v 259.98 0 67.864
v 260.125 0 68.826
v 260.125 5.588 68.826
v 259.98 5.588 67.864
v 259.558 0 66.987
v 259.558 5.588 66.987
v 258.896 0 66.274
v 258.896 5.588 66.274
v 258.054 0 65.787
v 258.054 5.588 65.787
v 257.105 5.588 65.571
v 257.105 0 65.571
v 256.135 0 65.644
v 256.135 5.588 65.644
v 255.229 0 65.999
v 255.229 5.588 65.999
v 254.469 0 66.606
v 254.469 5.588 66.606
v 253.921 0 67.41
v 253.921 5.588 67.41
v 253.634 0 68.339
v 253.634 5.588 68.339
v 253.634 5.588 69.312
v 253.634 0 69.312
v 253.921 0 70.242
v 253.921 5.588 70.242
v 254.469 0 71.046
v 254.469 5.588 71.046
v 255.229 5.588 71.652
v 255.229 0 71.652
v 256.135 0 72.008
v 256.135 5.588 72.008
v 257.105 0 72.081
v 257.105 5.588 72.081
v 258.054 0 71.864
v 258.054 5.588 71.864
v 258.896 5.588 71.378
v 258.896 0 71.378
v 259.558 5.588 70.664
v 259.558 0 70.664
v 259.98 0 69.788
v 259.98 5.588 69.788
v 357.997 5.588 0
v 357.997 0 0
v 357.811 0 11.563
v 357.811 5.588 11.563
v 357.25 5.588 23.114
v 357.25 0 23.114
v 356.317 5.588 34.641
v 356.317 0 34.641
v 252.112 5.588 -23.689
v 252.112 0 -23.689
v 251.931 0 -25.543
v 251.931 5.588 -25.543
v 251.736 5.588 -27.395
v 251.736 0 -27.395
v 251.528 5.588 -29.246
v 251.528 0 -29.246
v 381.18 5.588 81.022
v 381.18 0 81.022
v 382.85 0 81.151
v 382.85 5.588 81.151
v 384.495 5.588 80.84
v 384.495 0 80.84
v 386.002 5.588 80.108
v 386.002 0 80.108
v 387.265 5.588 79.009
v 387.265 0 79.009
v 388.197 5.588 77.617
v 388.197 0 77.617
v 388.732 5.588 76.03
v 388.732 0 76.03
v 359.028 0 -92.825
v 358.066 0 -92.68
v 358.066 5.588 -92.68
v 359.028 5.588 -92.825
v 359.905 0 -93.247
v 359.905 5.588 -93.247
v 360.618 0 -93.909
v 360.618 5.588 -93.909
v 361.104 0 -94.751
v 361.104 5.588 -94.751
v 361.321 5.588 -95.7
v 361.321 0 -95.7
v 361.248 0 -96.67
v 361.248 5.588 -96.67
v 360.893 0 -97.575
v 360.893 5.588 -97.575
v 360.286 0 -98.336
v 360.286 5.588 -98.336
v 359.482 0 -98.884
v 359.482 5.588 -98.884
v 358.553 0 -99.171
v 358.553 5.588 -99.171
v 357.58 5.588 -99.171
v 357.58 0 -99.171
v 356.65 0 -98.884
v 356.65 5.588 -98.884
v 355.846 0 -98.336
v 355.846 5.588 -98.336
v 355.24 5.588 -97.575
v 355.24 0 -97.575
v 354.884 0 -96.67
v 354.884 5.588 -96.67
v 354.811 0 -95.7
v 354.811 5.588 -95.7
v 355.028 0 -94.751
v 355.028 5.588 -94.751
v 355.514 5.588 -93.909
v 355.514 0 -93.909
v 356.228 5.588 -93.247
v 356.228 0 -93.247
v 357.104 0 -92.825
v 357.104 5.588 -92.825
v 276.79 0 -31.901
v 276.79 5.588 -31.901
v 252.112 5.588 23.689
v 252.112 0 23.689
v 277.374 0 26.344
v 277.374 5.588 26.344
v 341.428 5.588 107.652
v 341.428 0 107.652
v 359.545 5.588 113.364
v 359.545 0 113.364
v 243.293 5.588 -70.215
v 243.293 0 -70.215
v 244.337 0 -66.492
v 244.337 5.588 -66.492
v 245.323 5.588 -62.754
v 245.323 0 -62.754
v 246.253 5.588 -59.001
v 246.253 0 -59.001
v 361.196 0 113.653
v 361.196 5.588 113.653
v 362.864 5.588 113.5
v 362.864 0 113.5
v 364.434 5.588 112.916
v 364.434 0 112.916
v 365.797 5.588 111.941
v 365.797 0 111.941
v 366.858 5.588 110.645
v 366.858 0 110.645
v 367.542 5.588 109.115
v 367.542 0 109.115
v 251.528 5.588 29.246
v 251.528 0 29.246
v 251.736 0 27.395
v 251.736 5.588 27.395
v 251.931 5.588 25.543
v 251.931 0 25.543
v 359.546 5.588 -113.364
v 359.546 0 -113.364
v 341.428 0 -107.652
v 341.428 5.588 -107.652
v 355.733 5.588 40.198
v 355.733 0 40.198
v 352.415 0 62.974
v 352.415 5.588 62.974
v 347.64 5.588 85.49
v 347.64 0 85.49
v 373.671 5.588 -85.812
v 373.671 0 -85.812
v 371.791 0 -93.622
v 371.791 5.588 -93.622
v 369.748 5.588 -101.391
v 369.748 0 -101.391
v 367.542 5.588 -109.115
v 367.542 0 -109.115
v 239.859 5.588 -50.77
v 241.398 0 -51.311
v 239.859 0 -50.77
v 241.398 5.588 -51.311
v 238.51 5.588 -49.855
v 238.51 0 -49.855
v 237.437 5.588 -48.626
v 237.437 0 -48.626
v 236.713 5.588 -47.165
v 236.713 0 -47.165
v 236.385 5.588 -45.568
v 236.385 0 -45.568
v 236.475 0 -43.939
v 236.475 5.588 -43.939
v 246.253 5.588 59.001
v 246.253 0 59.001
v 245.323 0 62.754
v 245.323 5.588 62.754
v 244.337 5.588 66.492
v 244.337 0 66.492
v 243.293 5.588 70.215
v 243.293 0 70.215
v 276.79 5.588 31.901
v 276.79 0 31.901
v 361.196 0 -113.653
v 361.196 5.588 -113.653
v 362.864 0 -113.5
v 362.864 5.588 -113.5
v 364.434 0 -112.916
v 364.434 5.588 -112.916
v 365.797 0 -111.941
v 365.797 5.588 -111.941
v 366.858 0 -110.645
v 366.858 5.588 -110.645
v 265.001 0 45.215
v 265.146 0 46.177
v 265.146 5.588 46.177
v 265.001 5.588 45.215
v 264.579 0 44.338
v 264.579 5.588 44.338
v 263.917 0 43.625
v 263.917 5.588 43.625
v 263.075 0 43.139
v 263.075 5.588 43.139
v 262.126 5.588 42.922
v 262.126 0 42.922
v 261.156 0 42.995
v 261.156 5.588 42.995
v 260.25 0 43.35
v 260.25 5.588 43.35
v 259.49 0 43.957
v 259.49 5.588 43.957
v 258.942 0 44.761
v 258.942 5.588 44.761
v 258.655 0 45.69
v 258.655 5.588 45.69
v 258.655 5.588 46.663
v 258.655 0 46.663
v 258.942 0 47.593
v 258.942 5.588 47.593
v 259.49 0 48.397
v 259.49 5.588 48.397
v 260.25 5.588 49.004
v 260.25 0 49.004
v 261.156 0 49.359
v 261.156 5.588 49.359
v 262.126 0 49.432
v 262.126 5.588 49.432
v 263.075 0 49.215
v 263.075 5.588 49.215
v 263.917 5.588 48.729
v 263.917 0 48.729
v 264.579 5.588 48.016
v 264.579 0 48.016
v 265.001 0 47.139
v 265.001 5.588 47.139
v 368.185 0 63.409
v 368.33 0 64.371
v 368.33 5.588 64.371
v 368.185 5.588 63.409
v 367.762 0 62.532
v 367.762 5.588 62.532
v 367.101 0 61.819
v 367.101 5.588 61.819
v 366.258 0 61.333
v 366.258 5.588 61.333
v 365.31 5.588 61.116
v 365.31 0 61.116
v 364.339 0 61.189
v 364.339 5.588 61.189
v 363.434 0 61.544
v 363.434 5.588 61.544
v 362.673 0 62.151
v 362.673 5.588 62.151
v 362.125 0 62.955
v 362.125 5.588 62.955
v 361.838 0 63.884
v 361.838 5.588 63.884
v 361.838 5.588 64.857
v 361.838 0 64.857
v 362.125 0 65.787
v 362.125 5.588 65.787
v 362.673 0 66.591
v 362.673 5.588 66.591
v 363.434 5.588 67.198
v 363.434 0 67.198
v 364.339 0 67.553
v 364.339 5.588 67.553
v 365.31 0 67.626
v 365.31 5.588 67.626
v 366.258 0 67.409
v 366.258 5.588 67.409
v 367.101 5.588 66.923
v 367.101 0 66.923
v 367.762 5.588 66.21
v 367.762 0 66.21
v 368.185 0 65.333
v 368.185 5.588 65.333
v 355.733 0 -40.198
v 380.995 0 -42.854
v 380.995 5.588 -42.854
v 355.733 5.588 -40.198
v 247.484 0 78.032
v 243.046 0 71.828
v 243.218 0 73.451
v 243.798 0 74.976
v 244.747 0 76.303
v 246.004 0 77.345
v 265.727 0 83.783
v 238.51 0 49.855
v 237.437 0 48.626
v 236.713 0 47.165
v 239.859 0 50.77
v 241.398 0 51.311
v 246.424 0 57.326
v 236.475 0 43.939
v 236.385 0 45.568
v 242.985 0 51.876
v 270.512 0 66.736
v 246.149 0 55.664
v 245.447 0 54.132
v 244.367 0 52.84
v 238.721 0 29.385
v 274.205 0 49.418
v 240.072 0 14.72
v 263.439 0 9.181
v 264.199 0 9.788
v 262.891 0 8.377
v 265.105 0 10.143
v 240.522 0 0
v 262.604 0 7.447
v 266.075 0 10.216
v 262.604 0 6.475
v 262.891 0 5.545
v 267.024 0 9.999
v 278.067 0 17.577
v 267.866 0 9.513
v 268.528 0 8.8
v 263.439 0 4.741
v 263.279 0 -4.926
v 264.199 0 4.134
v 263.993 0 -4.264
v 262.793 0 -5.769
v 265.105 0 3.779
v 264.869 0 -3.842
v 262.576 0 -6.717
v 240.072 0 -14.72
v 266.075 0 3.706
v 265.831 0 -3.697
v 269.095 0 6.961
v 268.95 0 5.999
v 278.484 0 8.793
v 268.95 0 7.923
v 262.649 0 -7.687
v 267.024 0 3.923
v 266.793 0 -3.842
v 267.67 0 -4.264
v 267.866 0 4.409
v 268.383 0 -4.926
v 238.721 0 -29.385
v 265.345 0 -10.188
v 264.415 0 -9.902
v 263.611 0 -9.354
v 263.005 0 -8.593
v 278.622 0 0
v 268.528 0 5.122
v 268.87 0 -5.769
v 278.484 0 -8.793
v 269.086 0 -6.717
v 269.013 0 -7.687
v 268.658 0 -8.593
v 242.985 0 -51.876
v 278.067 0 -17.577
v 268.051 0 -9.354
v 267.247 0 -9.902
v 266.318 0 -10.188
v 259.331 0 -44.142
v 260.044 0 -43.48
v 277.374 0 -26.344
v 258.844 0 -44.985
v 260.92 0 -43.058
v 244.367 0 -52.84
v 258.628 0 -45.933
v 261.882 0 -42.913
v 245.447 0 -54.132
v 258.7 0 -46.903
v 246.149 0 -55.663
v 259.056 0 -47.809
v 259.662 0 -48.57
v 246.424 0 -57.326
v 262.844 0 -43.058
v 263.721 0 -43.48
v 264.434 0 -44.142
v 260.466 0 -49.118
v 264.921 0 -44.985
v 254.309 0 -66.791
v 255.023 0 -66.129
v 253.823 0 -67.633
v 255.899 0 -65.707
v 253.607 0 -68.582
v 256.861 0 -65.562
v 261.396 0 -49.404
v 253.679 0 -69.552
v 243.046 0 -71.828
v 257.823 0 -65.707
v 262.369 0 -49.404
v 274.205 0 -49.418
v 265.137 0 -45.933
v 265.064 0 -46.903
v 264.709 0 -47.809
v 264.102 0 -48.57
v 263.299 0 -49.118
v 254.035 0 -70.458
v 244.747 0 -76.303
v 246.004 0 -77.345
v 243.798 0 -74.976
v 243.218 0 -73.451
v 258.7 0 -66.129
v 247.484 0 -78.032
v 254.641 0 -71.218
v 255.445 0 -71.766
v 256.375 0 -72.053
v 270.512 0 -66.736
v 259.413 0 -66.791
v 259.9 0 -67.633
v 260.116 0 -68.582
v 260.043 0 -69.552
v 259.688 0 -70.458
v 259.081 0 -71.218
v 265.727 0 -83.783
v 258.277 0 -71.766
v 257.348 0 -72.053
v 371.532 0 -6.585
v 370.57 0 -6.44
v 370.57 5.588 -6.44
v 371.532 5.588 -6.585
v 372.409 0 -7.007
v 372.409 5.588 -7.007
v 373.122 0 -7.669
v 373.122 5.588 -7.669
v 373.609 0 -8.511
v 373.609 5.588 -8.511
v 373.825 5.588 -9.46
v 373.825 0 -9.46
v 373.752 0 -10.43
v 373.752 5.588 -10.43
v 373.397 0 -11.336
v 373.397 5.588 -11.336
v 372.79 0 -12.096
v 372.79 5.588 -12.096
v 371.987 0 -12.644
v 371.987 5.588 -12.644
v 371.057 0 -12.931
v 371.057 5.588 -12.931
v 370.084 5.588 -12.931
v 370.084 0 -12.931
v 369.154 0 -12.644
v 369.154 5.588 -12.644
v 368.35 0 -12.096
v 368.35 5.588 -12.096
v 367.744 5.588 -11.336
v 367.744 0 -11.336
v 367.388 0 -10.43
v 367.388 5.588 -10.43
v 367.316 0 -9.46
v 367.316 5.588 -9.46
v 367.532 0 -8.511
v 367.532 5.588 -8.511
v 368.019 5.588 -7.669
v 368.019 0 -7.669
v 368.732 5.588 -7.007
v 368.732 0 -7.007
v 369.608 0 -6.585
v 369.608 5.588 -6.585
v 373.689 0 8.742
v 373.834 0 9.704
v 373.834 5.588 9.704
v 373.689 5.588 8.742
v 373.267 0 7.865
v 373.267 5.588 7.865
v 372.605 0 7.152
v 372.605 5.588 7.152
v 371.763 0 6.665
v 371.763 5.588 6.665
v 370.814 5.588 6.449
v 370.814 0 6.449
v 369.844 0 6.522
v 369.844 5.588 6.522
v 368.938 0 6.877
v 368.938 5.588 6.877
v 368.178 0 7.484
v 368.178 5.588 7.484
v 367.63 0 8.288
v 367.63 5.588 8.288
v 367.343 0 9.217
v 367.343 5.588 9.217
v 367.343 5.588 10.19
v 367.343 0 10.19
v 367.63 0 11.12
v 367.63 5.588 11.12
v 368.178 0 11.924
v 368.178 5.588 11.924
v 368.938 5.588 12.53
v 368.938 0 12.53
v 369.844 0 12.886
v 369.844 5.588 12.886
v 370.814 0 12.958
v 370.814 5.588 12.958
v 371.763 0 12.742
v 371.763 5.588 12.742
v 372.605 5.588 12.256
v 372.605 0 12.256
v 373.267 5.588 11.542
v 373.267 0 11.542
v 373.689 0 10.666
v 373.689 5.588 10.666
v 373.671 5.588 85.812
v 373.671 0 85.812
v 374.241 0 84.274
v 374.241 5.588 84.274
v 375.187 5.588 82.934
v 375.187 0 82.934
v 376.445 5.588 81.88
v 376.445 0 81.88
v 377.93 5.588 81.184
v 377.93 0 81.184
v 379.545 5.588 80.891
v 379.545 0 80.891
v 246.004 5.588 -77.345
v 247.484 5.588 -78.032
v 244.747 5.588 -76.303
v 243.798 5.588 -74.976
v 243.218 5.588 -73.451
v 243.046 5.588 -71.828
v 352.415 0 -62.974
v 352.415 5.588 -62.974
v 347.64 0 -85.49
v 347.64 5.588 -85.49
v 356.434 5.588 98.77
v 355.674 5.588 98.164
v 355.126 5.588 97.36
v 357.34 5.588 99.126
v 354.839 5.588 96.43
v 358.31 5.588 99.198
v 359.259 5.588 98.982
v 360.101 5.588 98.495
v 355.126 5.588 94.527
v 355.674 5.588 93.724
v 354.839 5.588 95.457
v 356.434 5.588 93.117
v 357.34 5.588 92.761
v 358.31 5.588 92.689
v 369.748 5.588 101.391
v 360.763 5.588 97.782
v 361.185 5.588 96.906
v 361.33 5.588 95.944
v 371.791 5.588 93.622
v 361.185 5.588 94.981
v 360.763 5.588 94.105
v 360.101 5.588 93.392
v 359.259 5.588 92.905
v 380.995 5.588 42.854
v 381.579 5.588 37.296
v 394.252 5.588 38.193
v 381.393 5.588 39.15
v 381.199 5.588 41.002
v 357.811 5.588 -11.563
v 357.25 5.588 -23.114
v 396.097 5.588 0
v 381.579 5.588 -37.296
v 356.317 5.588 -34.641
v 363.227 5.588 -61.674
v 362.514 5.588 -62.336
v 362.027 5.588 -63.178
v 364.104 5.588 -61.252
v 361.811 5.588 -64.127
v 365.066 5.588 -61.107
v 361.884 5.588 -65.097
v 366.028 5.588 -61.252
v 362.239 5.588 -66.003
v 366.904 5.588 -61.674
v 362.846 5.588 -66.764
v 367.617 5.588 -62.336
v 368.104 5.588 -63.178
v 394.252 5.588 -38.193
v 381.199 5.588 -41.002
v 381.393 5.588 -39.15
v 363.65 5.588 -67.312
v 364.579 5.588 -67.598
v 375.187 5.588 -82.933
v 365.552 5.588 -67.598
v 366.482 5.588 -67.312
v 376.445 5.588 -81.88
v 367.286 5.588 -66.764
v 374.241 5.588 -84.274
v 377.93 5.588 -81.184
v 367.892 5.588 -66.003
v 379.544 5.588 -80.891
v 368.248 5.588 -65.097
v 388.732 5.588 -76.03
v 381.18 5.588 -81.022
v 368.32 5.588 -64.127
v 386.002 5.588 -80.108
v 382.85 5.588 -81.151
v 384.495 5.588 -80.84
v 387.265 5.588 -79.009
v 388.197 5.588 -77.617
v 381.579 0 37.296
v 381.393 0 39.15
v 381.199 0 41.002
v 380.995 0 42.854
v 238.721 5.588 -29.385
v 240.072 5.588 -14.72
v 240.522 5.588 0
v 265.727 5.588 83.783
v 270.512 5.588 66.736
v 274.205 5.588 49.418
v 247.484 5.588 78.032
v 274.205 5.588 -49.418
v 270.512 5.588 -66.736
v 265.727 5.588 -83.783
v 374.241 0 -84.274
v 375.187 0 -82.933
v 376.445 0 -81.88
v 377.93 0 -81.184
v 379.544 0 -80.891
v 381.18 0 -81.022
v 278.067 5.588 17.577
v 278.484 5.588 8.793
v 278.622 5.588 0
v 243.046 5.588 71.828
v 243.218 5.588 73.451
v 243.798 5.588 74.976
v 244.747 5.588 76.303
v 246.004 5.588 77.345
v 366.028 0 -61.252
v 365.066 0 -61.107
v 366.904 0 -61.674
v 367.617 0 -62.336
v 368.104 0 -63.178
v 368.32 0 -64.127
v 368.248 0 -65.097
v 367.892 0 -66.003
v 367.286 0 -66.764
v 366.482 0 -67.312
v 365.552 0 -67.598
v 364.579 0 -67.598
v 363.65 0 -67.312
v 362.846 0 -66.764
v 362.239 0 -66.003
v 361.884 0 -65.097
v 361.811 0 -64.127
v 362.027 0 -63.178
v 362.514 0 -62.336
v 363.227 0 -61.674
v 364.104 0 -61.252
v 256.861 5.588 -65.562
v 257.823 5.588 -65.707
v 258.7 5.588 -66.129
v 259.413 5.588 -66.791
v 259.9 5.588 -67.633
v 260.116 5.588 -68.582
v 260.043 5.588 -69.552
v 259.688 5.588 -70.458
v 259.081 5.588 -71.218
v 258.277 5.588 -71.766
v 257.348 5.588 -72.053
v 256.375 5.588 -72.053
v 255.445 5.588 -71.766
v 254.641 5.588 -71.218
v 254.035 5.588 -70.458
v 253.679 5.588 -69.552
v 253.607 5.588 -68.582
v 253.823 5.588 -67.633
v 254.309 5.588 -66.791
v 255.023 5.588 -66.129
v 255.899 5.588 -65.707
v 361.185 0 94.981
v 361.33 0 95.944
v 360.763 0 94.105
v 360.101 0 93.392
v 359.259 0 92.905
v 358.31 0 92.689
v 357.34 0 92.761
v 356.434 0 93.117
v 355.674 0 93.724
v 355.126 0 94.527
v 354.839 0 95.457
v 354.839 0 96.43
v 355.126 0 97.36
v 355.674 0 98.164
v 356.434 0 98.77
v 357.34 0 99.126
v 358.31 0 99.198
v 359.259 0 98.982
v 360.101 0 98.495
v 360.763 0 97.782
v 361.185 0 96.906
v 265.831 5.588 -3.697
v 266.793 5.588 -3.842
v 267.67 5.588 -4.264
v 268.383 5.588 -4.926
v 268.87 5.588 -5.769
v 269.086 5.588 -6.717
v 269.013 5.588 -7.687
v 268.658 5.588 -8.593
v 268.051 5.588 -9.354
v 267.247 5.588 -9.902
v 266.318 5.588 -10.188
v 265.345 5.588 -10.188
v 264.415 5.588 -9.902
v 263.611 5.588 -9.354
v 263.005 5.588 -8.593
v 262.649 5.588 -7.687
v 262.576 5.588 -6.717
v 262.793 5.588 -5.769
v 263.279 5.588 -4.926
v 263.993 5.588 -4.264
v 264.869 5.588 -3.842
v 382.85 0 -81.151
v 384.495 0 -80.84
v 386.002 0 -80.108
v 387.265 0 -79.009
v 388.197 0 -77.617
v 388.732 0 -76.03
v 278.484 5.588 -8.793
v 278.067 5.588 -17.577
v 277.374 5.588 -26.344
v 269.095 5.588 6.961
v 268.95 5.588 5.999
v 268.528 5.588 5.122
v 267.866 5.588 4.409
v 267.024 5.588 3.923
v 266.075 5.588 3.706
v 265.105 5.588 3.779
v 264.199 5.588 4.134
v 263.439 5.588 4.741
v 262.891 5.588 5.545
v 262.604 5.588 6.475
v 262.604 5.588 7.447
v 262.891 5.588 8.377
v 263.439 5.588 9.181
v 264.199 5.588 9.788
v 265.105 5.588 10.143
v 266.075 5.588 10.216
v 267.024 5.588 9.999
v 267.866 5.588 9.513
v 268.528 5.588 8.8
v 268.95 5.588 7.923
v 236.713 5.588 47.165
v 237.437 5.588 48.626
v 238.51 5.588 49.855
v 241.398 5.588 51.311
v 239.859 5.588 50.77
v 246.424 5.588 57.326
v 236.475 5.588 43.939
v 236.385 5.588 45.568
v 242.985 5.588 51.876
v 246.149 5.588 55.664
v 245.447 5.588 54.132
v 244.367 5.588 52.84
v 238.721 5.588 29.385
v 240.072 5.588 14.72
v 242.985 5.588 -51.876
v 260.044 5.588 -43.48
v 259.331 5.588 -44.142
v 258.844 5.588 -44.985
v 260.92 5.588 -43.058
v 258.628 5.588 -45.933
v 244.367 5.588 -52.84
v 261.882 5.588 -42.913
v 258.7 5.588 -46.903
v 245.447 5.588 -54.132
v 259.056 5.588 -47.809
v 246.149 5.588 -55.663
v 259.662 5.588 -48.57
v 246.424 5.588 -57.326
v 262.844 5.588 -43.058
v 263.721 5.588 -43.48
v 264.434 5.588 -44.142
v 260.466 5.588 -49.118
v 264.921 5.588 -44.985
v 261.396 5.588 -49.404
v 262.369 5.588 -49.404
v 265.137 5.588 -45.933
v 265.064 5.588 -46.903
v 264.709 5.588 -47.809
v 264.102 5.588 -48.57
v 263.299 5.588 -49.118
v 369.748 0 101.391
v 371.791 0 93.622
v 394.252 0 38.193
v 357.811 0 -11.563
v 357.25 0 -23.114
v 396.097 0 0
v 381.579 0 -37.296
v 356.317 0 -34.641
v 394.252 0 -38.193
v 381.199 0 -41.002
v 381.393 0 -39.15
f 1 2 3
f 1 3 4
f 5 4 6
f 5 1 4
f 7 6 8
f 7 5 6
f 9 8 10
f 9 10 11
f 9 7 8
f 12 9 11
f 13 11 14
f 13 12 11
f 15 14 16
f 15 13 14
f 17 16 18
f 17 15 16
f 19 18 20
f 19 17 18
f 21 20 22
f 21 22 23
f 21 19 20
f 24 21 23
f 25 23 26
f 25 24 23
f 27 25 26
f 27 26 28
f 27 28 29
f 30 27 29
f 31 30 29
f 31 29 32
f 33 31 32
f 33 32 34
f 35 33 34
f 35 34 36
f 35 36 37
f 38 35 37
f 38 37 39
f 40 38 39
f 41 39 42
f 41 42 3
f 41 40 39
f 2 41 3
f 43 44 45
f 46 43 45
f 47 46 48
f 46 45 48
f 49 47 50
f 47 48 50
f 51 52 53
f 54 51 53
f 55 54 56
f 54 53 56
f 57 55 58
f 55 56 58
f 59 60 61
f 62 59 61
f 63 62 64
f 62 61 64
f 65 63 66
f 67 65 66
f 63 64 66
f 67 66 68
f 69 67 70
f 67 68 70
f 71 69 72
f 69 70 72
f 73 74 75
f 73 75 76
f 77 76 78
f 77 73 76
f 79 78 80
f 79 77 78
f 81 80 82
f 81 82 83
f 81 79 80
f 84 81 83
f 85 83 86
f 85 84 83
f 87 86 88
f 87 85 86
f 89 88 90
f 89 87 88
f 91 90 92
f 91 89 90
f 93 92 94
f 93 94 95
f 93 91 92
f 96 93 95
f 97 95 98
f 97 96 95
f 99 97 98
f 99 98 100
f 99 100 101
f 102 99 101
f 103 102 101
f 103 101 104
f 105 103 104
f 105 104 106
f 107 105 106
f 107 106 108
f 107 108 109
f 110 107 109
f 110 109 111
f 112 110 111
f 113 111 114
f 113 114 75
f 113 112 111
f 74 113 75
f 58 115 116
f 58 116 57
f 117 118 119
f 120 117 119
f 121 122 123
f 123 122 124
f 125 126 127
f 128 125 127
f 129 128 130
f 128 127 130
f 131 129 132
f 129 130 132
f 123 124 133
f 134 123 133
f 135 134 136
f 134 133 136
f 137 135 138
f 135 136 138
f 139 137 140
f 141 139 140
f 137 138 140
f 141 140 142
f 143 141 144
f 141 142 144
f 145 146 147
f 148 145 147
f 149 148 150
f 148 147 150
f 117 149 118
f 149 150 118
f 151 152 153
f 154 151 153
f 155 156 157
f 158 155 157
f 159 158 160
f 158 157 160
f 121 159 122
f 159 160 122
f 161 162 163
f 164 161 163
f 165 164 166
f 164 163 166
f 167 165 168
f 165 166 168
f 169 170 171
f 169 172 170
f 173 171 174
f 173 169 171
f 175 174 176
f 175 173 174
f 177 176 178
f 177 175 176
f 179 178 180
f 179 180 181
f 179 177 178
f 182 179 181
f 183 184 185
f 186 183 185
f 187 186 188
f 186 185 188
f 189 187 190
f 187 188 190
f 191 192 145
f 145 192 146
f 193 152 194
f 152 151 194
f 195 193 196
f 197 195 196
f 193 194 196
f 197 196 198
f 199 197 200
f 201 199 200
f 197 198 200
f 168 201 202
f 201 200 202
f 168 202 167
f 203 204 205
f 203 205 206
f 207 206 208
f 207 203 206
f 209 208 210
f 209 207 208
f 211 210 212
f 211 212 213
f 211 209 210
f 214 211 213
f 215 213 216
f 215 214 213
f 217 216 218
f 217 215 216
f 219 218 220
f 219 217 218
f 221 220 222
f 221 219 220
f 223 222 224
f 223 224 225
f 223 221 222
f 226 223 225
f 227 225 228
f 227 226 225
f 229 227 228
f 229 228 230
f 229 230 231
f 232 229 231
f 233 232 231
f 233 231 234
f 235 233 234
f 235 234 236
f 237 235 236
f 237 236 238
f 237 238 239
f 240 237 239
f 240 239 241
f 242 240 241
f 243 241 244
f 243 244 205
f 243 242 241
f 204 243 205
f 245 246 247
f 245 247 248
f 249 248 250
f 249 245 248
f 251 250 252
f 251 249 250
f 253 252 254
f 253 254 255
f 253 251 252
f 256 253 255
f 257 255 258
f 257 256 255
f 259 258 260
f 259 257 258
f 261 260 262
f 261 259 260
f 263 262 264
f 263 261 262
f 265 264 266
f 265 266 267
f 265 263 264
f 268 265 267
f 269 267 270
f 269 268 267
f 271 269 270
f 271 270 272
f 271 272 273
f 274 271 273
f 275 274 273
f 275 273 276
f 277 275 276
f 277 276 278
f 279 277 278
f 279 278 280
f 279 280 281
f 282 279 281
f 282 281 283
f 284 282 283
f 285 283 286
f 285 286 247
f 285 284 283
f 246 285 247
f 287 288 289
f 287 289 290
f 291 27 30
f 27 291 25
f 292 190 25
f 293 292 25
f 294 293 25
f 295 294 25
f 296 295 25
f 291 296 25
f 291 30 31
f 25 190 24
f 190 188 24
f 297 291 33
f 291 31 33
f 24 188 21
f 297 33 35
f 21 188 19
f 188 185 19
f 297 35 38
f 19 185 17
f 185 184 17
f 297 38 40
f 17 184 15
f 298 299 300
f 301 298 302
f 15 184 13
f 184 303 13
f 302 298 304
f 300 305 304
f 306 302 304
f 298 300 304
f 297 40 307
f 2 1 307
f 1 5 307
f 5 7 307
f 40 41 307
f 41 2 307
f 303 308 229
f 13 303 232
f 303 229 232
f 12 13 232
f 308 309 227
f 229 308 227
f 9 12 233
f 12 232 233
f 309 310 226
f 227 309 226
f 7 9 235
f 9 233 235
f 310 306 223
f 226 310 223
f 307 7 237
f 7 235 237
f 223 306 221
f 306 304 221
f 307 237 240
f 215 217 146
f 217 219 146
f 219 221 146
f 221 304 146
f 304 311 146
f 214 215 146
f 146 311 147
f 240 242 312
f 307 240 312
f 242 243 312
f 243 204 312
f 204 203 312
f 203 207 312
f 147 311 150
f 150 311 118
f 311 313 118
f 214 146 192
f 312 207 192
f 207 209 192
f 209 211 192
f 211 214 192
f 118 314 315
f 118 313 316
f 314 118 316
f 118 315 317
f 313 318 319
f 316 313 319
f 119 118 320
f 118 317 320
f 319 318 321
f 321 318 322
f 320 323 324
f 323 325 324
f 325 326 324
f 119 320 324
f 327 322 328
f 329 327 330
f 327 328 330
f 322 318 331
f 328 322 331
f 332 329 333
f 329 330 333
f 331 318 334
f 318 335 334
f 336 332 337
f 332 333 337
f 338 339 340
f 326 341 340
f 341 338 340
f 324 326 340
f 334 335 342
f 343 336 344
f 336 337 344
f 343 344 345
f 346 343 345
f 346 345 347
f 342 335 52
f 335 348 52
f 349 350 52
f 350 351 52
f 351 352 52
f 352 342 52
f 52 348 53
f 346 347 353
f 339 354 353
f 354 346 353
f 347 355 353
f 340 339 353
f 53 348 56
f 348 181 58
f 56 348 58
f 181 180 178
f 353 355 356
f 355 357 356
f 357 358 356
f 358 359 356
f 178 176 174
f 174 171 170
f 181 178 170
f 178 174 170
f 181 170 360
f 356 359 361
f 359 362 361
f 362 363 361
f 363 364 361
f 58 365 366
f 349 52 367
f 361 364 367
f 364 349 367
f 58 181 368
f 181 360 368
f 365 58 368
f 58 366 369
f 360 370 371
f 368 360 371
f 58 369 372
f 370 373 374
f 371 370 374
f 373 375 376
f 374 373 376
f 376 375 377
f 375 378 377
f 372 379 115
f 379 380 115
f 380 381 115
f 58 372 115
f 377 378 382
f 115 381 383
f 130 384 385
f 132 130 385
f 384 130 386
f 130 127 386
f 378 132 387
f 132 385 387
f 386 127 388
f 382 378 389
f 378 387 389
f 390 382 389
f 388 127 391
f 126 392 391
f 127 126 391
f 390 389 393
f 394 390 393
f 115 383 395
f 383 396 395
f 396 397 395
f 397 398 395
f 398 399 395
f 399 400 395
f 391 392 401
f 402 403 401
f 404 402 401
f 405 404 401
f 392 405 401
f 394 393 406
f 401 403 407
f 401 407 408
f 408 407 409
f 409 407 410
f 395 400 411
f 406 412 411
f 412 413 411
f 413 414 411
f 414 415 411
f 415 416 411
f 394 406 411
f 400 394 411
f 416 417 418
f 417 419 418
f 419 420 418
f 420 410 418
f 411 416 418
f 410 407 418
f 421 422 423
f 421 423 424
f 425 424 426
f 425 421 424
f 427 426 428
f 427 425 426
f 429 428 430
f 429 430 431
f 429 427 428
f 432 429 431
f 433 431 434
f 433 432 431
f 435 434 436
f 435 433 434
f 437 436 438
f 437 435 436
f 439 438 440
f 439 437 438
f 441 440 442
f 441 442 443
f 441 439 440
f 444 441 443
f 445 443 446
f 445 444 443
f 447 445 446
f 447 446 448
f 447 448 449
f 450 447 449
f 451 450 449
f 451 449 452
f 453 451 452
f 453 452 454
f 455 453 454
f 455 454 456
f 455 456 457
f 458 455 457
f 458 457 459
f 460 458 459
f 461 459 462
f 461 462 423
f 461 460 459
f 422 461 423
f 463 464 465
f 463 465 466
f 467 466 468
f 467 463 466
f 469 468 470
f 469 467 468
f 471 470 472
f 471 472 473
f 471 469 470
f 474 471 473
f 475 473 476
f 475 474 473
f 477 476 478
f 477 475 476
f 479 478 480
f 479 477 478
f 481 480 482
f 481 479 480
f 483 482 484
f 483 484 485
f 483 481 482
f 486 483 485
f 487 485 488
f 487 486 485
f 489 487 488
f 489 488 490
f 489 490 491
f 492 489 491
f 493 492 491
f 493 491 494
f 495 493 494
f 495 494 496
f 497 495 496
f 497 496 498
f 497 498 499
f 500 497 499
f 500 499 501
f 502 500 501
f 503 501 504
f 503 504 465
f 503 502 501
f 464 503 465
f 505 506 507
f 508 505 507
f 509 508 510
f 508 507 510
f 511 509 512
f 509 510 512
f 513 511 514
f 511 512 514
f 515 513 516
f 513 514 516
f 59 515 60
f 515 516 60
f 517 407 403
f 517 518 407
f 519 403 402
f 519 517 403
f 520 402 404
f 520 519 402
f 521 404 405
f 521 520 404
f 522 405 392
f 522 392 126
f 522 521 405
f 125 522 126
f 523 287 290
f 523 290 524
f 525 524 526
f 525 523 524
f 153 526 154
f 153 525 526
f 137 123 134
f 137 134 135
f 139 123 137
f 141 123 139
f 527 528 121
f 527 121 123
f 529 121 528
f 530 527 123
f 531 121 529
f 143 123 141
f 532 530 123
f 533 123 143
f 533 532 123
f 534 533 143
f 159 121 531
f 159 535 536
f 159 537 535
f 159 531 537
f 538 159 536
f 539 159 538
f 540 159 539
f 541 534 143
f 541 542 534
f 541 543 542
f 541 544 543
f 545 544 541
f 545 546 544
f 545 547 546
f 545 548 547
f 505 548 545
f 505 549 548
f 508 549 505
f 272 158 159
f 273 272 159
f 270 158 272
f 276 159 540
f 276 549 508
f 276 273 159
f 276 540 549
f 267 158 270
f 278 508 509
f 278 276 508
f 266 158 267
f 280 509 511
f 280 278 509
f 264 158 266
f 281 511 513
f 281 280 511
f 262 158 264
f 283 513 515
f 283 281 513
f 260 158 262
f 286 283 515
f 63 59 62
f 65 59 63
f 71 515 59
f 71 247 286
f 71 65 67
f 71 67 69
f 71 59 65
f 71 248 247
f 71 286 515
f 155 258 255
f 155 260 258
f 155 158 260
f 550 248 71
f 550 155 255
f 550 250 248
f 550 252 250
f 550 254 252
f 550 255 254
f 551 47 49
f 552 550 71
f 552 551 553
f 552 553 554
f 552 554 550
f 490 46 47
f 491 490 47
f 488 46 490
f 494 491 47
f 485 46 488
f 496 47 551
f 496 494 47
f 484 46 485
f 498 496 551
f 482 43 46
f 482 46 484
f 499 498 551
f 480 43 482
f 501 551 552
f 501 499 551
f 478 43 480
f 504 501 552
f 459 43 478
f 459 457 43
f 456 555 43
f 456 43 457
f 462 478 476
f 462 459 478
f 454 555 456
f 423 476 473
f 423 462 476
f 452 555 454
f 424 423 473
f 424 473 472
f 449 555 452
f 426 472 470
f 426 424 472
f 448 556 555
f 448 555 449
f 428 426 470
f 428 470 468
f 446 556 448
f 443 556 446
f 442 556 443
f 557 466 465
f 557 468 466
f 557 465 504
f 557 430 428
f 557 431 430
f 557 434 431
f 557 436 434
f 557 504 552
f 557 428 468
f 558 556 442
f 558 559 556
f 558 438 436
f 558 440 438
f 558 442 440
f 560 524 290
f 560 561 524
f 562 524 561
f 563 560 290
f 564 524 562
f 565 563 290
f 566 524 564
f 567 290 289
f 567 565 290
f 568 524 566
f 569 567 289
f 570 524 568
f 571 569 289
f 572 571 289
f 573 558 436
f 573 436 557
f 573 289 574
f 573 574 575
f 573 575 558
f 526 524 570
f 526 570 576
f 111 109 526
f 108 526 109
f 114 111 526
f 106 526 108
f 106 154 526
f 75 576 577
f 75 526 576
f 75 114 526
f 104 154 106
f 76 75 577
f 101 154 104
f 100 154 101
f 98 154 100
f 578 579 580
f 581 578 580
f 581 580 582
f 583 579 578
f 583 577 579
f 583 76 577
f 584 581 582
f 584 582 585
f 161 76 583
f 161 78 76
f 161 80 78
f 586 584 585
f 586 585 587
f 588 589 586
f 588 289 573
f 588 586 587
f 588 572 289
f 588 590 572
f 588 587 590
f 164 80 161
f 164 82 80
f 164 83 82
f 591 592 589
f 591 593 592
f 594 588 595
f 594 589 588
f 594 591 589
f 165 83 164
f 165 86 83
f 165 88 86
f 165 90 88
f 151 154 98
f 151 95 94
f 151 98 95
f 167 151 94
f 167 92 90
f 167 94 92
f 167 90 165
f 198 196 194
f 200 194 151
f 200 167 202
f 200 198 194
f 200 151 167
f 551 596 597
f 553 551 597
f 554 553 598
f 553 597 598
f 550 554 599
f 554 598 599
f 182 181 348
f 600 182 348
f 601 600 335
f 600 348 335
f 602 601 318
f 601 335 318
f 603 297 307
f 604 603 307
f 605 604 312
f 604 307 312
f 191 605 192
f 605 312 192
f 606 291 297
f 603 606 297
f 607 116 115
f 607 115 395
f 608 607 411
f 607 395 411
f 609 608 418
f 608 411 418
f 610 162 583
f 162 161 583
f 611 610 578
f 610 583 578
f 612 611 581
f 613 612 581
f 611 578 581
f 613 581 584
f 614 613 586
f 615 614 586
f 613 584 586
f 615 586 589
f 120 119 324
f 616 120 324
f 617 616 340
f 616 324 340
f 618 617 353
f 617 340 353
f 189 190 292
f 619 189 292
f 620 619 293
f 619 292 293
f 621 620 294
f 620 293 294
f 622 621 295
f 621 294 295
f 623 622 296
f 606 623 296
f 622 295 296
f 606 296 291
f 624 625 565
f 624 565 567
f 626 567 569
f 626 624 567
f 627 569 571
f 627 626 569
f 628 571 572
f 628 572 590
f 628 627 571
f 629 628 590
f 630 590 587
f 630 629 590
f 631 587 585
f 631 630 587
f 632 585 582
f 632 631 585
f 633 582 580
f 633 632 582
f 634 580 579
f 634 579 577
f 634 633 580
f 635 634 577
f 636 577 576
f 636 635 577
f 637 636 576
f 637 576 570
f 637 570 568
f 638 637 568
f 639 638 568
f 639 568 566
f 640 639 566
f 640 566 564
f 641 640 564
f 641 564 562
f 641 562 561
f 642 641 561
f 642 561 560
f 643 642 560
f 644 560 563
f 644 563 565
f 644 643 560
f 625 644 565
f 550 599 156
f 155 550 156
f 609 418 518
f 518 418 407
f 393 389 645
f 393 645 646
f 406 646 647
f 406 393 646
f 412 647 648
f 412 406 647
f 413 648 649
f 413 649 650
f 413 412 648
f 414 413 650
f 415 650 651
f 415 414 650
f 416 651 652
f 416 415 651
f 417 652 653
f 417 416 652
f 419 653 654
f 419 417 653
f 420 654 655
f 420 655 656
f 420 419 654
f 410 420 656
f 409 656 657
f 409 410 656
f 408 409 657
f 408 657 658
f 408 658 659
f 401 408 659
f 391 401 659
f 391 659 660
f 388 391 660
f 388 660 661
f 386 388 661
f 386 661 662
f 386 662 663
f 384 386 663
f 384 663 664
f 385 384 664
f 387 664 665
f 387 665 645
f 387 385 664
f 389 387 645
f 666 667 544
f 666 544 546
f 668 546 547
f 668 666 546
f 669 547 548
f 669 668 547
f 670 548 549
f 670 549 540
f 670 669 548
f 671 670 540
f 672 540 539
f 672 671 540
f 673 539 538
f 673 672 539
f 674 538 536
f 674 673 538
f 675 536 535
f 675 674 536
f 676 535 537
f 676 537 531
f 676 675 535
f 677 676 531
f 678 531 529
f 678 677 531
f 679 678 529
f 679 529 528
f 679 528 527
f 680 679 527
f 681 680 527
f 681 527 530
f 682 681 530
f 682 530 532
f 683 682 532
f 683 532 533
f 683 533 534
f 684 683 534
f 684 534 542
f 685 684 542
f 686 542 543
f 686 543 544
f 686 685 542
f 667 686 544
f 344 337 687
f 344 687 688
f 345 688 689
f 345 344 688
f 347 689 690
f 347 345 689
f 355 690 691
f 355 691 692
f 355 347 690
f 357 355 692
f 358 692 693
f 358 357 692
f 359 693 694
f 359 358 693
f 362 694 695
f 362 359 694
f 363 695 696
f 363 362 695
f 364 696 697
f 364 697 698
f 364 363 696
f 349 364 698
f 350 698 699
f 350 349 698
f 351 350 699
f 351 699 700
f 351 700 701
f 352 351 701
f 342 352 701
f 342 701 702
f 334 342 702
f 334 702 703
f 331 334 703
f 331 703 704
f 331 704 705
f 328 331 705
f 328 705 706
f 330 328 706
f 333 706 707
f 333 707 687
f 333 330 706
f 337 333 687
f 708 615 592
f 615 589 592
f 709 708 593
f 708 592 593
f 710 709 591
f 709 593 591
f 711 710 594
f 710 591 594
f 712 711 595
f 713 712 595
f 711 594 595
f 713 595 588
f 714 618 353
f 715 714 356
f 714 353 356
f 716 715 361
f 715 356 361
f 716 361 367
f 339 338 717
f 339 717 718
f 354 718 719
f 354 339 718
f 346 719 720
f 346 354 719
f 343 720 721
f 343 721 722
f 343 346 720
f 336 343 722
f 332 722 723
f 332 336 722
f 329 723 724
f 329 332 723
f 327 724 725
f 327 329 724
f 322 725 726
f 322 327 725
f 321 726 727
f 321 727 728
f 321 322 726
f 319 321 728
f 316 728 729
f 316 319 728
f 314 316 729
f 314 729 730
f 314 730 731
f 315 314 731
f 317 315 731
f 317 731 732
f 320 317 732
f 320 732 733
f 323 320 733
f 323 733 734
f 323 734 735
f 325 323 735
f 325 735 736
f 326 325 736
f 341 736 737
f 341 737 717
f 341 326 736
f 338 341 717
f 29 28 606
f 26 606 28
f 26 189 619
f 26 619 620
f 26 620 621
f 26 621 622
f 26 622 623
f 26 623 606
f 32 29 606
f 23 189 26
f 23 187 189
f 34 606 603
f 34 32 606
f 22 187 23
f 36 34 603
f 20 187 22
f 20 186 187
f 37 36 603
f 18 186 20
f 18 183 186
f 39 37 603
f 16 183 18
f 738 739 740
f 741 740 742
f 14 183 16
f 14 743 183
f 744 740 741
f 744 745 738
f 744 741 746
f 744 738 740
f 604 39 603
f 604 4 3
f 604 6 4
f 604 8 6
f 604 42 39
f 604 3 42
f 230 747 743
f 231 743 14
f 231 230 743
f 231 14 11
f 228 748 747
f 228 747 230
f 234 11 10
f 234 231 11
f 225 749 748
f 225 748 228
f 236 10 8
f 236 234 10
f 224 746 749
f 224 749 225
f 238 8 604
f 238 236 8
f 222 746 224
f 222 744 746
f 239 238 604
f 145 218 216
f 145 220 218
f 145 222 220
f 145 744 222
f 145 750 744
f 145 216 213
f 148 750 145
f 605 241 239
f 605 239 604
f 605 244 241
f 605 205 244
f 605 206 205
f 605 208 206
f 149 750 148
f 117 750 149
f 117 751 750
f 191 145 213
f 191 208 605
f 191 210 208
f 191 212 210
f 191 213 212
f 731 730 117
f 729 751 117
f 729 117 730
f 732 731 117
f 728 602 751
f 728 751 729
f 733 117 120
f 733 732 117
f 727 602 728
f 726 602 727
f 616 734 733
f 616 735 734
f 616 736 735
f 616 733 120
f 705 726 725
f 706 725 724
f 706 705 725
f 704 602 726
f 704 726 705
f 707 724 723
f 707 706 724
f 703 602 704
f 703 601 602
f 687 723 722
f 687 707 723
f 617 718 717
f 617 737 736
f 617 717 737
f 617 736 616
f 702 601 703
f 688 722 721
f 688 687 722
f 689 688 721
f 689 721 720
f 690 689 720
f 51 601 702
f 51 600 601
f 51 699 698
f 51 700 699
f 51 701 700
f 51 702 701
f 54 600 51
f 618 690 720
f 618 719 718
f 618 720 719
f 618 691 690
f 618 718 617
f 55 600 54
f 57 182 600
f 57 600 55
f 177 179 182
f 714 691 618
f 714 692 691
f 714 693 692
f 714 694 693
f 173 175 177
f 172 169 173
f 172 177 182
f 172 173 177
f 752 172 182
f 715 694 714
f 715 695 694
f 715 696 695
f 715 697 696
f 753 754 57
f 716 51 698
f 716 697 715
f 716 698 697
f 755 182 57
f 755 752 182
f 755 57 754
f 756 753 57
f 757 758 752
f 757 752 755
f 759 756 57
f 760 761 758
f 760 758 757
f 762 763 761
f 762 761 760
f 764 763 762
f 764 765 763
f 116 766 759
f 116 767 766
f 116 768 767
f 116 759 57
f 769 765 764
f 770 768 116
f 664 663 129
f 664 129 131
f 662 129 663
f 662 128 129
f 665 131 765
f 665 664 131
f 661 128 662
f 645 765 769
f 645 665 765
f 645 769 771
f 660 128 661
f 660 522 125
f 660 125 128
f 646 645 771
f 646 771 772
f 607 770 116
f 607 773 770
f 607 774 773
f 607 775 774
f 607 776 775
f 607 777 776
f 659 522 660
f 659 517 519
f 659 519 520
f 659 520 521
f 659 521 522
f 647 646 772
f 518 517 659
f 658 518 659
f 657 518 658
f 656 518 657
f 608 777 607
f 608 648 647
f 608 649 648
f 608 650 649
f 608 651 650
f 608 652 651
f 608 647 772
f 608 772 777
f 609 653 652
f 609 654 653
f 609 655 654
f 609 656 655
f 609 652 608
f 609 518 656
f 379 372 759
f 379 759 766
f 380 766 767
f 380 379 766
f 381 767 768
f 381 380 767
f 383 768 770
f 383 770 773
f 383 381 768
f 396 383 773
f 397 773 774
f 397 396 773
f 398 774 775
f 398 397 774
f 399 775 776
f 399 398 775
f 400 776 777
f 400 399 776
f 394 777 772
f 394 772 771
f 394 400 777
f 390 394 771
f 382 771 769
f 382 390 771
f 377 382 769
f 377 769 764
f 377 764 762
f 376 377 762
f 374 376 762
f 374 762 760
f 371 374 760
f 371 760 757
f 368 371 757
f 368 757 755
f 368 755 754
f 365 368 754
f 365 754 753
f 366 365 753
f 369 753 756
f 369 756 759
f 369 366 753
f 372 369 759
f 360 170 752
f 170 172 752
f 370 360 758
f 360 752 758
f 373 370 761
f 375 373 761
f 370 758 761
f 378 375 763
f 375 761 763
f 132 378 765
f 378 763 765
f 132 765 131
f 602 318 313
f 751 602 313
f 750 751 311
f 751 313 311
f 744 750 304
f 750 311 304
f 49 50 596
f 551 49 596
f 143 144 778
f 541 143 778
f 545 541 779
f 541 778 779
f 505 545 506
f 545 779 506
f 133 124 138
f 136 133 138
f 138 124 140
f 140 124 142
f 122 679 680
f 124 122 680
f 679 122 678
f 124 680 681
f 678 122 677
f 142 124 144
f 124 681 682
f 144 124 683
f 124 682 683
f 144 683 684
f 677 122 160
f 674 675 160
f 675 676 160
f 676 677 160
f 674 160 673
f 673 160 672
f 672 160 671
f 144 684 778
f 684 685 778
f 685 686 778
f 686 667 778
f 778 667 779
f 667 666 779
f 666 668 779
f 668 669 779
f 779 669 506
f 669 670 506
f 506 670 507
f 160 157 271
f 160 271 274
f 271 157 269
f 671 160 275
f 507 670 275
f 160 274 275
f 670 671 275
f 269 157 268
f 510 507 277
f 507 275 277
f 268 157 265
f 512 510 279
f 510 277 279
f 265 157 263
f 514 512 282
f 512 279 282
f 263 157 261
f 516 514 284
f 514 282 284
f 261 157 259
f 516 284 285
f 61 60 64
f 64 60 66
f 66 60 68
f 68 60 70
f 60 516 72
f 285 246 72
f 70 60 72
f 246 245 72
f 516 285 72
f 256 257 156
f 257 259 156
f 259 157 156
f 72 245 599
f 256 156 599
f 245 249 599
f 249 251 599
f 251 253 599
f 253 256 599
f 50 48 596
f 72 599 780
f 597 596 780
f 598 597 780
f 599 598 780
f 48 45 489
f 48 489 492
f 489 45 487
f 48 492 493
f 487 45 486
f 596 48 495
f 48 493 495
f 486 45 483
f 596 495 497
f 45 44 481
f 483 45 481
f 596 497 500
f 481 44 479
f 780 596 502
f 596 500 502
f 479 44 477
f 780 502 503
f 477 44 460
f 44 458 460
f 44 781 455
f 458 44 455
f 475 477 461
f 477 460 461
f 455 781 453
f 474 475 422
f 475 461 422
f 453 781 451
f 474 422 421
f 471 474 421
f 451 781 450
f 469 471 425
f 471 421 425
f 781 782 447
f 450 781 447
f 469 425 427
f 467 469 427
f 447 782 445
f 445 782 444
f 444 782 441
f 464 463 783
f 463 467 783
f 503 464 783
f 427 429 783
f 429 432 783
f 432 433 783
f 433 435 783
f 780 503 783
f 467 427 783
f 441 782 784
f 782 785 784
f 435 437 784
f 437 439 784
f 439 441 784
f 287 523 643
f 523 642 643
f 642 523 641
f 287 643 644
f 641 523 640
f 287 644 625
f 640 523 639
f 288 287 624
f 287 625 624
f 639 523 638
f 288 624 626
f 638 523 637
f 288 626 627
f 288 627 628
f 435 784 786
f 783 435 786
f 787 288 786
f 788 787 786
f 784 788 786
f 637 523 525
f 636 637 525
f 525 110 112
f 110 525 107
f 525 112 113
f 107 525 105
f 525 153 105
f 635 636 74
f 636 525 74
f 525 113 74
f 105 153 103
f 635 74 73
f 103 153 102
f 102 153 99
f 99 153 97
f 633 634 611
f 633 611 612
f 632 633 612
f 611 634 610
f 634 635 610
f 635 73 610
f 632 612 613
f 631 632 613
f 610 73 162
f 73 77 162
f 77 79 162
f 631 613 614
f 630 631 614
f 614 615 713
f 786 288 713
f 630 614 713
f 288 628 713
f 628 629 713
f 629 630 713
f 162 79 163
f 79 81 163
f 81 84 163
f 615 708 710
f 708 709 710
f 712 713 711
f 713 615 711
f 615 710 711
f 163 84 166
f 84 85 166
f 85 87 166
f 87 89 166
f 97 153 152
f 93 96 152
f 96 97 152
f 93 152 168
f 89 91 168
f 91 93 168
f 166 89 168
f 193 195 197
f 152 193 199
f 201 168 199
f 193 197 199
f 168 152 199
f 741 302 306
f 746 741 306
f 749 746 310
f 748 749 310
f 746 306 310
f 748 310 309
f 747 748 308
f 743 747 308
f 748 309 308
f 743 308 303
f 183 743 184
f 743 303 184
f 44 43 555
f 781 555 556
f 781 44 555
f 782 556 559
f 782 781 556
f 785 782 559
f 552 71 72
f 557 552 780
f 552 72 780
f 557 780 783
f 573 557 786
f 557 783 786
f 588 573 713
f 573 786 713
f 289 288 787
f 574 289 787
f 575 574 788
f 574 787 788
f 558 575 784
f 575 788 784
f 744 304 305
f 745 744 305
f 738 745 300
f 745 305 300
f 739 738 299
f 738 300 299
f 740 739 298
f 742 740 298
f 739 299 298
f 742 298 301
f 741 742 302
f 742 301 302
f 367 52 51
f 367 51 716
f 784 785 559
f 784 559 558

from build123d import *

# Parameters (mm, degrees)
BOSS_EXTRUDE1_DEPTH = 5.588
SKETCH9_R           = 3.2639
CUT_EXTRUDE4_DEPTH  = 5.588
CUT_EXTRUDE3_DEPTH  = 401.395458897
BOSS_EXTRUDE2_DEPTH = 5.588
FILLET1_R           = 6.35
SKETCH12_R          = 357.997386184
SKETCH12_R_2        = 278.622386184
CUT_EXTRUDE8_DEPTH  = 413.11957813
MIRROR1_OUTLINE_R   = 3.2639
MIRROR1_DEPTH       = 5.588


# Read off the part's stored shape, not the designer's step: Mirror1
with BuildPart() as part:
    # Sketch2 → Boss-Extrude1 (new body)
    with BuildSketch(Plane(origin=(0, 0, 0), x_dir=(1, 0, 0), z_dir=(0, 1, 0))):
        with BuildLine():
            Line((365.652586076, 115.28981754), (241.502482012, 76.14544009))
            ThreePointArc((241.502482012, 76.14544009), (250.275260093, 38.521046845), (253.222386184, 0))
            Line((253.222386184, 0), (383.397386184, 0))
            ThreePointArc((383.397386184, 0), (378.935219718, 58.323708643), (365.652586076, 115.28981754))
        make_face()
    extrude(amount=BOSS_EXTRUDE1_DEPTH)

    # Sketch9 → Cut-Extrude4 (cut)
    with BuildSketch(Plane(origin=(0, 0, 0), x_dir=(1, 0, 0), z_dir=(0, 1, 0))):
        with Locations(Location((256.861300603, 68.825778063, 0), (0, 0, 270))):
            Circle(SKETCH9_R)
        with Locations(Location((261.882427613, 46.176937762, 0), (0, 0, 270))):
            Circle(SKETCH9_R)
        with Locations(Location((265.831261224, 6.961036557, 0), (0, 0, 270))):
            Circle(SKETCH9_R)
        with Locations(Location((365.065659935, 64.370925577, 0), (0, 0, 270))):
            Circle(SKETCH9_R)
        with Locations(Location((358.066179053, 95.943543514, 0), (0, 0, 270))):
            Circle(SKETCH9_R)
        with Locations(Location((370.570357448, 9.703726316, 0), (0, 0, 270))):
            Circle(SKETCH9_R)
    extrude(amount=CUT_EXTRUDE4_DEPTH, mode=Mode.SUBTRACT)

    # Sketch8 → Cut-Extrude3 (cut, through all)
    with BuildSketch(Plane(origin=(0, 0, 0), x_dir=(1, 0, 0), z_dir=(0, 1, 0))):
        Polygon((251.928355604, 23.669347024), (283.504425782, 26.988125733), (282.92032073, 32.545514085), (251.344250552, 29.226735376), align=None)
        Polygon((350.211981914, 33.999372407), (381.788052092, 37.318151116), (381.203947039, 42.875539467), (349.627876862, 39.556760758), align=None)
    extrude(amount=CUT_EXTRUDE3_DEPTH, mode=Mode.SUBTRACT)

    # Sketch11 → Boss-Extrude2 (add)
    with BuildSketch(Plane(origin=(0, 0, 0), x_dir=(1, 0, 0), z_dir=(0, 1, 0))):
        with BuildLine():
            Line((247.688869498, 52.647894464), (235.266394968, 50.007415991))
            ThreePointArc((235.266394968, 50.007415991), (239.204779386, 25.141435409), (240.522386184, 0))
            Line((240.522386184, 0), (253.222386184, 0))
            ThreePointArc((253.222386184, 0), (251.835207457, 26.468946893), (247.688869498, 52.647894464))
        make_face()
        with BuildLine():
            Line((387.441707953, 82.35327729), (375.019233423, 79.712798817))
            ThreePointArc((375.019233423, 79.712798817), (381.297095187, 40.075939599), (383.397386184, 0))
            Line((383.397386184, 0), (396.097386184, 0))
            ThreePointArc((396.097386184, 0), (393.927523258, 41.403451082), (387.441707953, 82.35327729))
        make_face()
    extrude(amount=BOSS_EXTRUDE2_DEPTH)

    # Fillet1
    fillet1_edges = [part.edges().sort_by_distance(p)[0] for p in [
        (235.266394968, 2.794, -50.007415991),
        (387.441707953, 2.794, -82.35327729),
        (375.019233423, 2.794, -79.712798817),
        (247.688869498, 2.794, -52.647894464),
        (365.652586076, 2.794, -115.28981754),
        (241.502482012, 2.794, -76.14544009),
    ]]
    fillet(fillet1_edges, radius=FILLET1_R - 0.0001)  # a hair under: the kernel refuses the full size

    # Sketch12 → Cut-Extrude8 (cut, through all)
    with BuildSketch(Plane(origin=(0, 0, 0), x_dir=(1, 0, 0), z_dir=(0, 1, 0))):
        Circle(SKETCH12_R)
        Circle(SKETCH12_R_2, mode=Mode.SUBTRACT)
    extrude(amount=CUT_EXTRUDE8_DEPTH, mode=Mode.SUBTRACT)


with BuildPart() as cut_extrude8_piece_1:
    # of the separate pieces the step leaves, piece 1, a body of its own (cut_extrude8_pieces)
    add(part.part.solids().sort_by_distance((359.545580237, 0, -113.364285996))[0])



with BuildPart() as cut_extrude8_piece_2:
    # of the separate pieces the step leaves, piece 2, a body of its own (cut_extrude8_pieces)
    add(part.part.solids().sort_by_distance((265.726892561, 0, -83.783367397))[0])


with BuildPart() as cut_extrude8_piece_1_1:
    add(cut_extrude8_piece_1.part)

    add(cut_extrude8_piece_2.part)  # Mirror1 merges Cut-Extrude8 piece 2
    # Mirror1 outline → Mirror1 (add)
    # profile 1 of 2: a face of its own
    with BuildSketch(Plane(origin=(0, 0, 0), x_dir=(1, 0, 0), z_dir=(0, 1, 0))):
        with BuildLine():
            ThreePointArc((367.542367114, -109.115370636), (370.789659245, -97.511970185), (373.670726786, -85.812258307))
            ThreePointArc((373.670726786, -85.812258307), (376.444671415, -81.879963574), (381.179868714, -81.022282272))
            ThreePointArc((381.179868714, -81.022282272), (386.001836103, -80.108251813), (388.732030913, -76.029911772))
            ThreePointArc((388.732030913, -76.029911772), (394.251747436, -38.192918003), (396.097386184, 0))
            Line((396.097386184, 0), (357.997386184, 0))
            ThreePointArc((357.997386184, 0), (357.577155049, -17.3408968), (356.31744821, -34.641082773))
            Line((356.31744821, -34.641082773), (381.579022742, -37.296181246))
            ThreePointArc((381.579022742, -37.296181246), (381.297095187, -40.075939599), (380.99491769, -42.853569597))
            Line((380.99491769, -42.853569597), (355.733343157, -40.198471124))
            ThreePointArc((355.733343157, -40.198471124), (350.208561747, -74.270396482), (341.428175527, -107.651890233))
            Line((341.428175527, -107.651890233), (359.545483246, -113.364255414))
            ThreePointArc((359.545483246, -113.364255414), (364.434396192, -112.915780636), (367.542367114, -109.115370636))
        make_face()
        with Locations((358.066179053, -95.943543514)):
            Circle(MIRROR1_OUTLINE_R, mode=Mode.SUBTRACT)
        with Locations((365.065659935, -64.370925577)):
            Circle(MIRROR1_OUTLINE_R, mode=Mode.SUBTRACT)
        with Locations((370.570357448, -9.703726316)):
            Circle(MIRROR1_OUTLINE_R, mode=Mode.SUBTRACT)
    # profile 2 of 2: a face of its own
    with BuildSketch(Plane(origin=(0, 0, 0), x_dir=(1, 0, 0), z_dir=(0, 1, 0))):
        with BuildLine():
            Line((247.484497403, -78.031562297), (265.726892561, -83.783367397))
            ThreePointArc((265.726892561, -83.783367397), (272.496065657, -58.106181121), (276.790078476, -31.90119966))
            Line((276.790078476, -31.90119966), (251.527824715, -29.246029798))
            ThreePointArc((251.527824715, -29.246029798), (251.835207457, -26.468946893), (252.111929767, -23.688641446))
            Line((252.111929767, -23.688641446), (277.374183529, -26.343811309))
            ThreePointArc((277.374183529, -26.343811309), (278.310160579, -13.186682715), (278.622386184, 0))
            Line((278.622386184, 0), (240.522386184, 0))
            ThreePointArc((240.522386184, 0), (239.50836087, -22.062713545), (236.474835046, -43.939397421))
            ThreePointArc((236.474835046, -43.939397421), (237.437341139, -48.626104602), (241.397736942, -51.310672959))
            ThreePointArc((241.397736942, -51.310672959), (245.447097835, -54.132235543), (246.252721001, -59.001476795))
            ThreePointArc((246.252721001, -59.001476795), (244.837051226, -64.625035488), (243.292976764, -70.214701609))
            ThreePointArc((243.292976764, -70.214701609), (243.797749033, -74.976244157), (247.484497403, -78.031562297))
        make_face()
        with Locations((256.861300603, -68.825778063)):
            Circle(MIRROR1_OUTLINE_R, mode=Mode.SUBTRACT)
        with Locations((261.882427613, -46.176937762)):
            Circle(MIRROR1_OUTLINE_R, mode=Mode.SUBTRACT)
        with Locations((265.831261224, -6.961036557)):
            Circle(MIRROR1_OUTLINE_R, mode=Mode.SUBTRACT)
    extrude(amount=MIRROR1_DEPTH)


solid = cut_extrude8_piece_1_1.part
